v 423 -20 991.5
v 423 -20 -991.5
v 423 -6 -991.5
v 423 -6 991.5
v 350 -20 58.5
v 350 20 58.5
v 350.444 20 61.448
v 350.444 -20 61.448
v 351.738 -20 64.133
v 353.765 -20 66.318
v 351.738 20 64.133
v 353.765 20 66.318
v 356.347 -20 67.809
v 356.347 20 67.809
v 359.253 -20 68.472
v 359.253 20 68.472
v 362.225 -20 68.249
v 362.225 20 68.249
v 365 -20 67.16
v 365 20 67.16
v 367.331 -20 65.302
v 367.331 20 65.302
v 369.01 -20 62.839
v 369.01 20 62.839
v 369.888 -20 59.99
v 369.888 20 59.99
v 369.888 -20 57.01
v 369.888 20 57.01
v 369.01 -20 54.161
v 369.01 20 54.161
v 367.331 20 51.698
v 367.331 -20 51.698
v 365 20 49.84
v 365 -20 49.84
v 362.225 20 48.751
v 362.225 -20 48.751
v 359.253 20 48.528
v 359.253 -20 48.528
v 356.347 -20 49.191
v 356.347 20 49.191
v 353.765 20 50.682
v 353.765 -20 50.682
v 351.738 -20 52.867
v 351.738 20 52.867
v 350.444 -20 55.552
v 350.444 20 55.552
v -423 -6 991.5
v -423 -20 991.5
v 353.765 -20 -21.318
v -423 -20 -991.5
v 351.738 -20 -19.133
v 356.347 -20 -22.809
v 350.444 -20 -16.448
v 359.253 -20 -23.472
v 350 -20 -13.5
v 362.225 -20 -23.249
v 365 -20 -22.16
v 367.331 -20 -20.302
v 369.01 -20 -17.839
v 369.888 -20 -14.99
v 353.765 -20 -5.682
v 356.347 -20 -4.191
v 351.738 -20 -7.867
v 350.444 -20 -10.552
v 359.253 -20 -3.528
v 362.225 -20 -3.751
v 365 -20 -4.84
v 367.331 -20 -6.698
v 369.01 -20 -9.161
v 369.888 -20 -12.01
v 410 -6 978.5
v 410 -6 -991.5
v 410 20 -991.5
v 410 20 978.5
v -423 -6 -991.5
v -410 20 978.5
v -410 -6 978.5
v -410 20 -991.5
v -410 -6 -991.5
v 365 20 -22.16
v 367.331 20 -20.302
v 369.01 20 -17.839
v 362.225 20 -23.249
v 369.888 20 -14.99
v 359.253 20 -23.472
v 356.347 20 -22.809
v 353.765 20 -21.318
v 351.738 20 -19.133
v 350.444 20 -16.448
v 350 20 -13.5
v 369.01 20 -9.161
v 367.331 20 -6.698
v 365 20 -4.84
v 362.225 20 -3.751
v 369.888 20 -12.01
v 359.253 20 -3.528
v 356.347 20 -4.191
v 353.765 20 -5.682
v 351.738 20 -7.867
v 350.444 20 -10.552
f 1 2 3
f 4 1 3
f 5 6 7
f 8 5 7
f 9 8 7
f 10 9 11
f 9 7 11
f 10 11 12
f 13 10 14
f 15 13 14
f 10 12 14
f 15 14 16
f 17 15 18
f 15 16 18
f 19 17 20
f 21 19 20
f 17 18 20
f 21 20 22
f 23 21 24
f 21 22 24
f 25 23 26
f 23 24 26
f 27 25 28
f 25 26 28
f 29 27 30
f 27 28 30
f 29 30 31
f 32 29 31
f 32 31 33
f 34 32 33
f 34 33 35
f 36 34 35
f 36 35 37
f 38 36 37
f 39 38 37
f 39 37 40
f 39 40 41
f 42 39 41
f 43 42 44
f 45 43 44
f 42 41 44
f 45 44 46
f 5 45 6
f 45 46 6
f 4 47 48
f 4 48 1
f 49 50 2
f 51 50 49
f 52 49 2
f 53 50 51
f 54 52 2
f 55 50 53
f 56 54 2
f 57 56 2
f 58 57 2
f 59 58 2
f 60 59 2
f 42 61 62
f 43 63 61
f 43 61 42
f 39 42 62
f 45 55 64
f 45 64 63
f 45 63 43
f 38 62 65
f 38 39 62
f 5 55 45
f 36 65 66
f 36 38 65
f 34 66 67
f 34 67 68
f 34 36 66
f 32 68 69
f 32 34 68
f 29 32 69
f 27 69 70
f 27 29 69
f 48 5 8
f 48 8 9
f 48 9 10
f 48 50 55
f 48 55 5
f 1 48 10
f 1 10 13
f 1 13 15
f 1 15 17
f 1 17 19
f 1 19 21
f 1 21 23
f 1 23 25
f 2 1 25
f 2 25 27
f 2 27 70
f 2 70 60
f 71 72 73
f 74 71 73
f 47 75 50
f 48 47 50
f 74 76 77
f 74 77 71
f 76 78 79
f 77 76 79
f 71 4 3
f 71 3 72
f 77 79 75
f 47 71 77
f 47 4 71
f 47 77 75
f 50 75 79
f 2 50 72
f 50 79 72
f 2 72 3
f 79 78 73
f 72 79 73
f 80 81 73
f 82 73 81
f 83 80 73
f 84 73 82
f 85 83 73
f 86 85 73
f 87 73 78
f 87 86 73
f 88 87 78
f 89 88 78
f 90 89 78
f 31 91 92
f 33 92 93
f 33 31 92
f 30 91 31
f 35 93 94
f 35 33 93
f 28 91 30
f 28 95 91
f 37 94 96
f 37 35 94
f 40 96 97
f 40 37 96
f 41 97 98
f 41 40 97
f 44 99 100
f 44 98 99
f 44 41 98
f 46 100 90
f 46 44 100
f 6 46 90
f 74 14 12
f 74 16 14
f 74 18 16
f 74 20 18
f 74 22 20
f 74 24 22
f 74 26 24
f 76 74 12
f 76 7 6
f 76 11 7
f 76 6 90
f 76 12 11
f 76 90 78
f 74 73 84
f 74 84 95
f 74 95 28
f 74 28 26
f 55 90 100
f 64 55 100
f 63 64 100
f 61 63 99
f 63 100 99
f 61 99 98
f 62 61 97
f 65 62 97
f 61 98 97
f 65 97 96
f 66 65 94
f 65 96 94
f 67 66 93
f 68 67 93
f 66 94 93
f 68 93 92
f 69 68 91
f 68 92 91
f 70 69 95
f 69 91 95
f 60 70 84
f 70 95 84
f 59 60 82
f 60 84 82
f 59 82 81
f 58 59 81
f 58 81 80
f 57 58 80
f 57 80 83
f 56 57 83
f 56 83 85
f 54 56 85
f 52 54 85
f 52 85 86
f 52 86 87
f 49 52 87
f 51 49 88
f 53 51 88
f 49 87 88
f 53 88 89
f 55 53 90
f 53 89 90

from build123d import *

# Parameters (mm, degrees)
F1_DEPTH = 991.5
F2_W     = 820
F2_H     = 26
F3_DEPTH = 13
F4_R     = 10
F5_DEPTH = 40


with BuildPart() as f1:
    # F0 (on Top) → F1 (new body, symmetric)
    with BuildSketch(Plane.XY):
        Polygon((-423, -6), (-423, -20), (423, -20), (423, -6), (410, -6), (410, 20), (-410, 20), (-410, -6), align=None)
    extrude(amount=F1_DEPTH, both=True)

    # F2 (on face) → F3 (cut)
    with BuildSketch(Plane.XY.offset(991.5)):
        with Locations((0, 7)):
            Rectangle(F2_W, F2_H)
    extrude(amount=-F3_DEPTH, mode=Mode.SUBTRACT)

    # F4 (on face) → F5 (cut, through all)
    with BuildSketch(Plane(origin=(0, 20, 0), x_dir=(-1, 0, 0), z_dir=(0, 1, 0))):
        with Locations((-360, 58.5)):
            Circle(F4_R)
        with Locations((-360, -13.5)):
            Circle(F4_R)
    extrude(amount=-F5_DEPTH, mode=Mode.SUBTRACT)


solid = f1.part
